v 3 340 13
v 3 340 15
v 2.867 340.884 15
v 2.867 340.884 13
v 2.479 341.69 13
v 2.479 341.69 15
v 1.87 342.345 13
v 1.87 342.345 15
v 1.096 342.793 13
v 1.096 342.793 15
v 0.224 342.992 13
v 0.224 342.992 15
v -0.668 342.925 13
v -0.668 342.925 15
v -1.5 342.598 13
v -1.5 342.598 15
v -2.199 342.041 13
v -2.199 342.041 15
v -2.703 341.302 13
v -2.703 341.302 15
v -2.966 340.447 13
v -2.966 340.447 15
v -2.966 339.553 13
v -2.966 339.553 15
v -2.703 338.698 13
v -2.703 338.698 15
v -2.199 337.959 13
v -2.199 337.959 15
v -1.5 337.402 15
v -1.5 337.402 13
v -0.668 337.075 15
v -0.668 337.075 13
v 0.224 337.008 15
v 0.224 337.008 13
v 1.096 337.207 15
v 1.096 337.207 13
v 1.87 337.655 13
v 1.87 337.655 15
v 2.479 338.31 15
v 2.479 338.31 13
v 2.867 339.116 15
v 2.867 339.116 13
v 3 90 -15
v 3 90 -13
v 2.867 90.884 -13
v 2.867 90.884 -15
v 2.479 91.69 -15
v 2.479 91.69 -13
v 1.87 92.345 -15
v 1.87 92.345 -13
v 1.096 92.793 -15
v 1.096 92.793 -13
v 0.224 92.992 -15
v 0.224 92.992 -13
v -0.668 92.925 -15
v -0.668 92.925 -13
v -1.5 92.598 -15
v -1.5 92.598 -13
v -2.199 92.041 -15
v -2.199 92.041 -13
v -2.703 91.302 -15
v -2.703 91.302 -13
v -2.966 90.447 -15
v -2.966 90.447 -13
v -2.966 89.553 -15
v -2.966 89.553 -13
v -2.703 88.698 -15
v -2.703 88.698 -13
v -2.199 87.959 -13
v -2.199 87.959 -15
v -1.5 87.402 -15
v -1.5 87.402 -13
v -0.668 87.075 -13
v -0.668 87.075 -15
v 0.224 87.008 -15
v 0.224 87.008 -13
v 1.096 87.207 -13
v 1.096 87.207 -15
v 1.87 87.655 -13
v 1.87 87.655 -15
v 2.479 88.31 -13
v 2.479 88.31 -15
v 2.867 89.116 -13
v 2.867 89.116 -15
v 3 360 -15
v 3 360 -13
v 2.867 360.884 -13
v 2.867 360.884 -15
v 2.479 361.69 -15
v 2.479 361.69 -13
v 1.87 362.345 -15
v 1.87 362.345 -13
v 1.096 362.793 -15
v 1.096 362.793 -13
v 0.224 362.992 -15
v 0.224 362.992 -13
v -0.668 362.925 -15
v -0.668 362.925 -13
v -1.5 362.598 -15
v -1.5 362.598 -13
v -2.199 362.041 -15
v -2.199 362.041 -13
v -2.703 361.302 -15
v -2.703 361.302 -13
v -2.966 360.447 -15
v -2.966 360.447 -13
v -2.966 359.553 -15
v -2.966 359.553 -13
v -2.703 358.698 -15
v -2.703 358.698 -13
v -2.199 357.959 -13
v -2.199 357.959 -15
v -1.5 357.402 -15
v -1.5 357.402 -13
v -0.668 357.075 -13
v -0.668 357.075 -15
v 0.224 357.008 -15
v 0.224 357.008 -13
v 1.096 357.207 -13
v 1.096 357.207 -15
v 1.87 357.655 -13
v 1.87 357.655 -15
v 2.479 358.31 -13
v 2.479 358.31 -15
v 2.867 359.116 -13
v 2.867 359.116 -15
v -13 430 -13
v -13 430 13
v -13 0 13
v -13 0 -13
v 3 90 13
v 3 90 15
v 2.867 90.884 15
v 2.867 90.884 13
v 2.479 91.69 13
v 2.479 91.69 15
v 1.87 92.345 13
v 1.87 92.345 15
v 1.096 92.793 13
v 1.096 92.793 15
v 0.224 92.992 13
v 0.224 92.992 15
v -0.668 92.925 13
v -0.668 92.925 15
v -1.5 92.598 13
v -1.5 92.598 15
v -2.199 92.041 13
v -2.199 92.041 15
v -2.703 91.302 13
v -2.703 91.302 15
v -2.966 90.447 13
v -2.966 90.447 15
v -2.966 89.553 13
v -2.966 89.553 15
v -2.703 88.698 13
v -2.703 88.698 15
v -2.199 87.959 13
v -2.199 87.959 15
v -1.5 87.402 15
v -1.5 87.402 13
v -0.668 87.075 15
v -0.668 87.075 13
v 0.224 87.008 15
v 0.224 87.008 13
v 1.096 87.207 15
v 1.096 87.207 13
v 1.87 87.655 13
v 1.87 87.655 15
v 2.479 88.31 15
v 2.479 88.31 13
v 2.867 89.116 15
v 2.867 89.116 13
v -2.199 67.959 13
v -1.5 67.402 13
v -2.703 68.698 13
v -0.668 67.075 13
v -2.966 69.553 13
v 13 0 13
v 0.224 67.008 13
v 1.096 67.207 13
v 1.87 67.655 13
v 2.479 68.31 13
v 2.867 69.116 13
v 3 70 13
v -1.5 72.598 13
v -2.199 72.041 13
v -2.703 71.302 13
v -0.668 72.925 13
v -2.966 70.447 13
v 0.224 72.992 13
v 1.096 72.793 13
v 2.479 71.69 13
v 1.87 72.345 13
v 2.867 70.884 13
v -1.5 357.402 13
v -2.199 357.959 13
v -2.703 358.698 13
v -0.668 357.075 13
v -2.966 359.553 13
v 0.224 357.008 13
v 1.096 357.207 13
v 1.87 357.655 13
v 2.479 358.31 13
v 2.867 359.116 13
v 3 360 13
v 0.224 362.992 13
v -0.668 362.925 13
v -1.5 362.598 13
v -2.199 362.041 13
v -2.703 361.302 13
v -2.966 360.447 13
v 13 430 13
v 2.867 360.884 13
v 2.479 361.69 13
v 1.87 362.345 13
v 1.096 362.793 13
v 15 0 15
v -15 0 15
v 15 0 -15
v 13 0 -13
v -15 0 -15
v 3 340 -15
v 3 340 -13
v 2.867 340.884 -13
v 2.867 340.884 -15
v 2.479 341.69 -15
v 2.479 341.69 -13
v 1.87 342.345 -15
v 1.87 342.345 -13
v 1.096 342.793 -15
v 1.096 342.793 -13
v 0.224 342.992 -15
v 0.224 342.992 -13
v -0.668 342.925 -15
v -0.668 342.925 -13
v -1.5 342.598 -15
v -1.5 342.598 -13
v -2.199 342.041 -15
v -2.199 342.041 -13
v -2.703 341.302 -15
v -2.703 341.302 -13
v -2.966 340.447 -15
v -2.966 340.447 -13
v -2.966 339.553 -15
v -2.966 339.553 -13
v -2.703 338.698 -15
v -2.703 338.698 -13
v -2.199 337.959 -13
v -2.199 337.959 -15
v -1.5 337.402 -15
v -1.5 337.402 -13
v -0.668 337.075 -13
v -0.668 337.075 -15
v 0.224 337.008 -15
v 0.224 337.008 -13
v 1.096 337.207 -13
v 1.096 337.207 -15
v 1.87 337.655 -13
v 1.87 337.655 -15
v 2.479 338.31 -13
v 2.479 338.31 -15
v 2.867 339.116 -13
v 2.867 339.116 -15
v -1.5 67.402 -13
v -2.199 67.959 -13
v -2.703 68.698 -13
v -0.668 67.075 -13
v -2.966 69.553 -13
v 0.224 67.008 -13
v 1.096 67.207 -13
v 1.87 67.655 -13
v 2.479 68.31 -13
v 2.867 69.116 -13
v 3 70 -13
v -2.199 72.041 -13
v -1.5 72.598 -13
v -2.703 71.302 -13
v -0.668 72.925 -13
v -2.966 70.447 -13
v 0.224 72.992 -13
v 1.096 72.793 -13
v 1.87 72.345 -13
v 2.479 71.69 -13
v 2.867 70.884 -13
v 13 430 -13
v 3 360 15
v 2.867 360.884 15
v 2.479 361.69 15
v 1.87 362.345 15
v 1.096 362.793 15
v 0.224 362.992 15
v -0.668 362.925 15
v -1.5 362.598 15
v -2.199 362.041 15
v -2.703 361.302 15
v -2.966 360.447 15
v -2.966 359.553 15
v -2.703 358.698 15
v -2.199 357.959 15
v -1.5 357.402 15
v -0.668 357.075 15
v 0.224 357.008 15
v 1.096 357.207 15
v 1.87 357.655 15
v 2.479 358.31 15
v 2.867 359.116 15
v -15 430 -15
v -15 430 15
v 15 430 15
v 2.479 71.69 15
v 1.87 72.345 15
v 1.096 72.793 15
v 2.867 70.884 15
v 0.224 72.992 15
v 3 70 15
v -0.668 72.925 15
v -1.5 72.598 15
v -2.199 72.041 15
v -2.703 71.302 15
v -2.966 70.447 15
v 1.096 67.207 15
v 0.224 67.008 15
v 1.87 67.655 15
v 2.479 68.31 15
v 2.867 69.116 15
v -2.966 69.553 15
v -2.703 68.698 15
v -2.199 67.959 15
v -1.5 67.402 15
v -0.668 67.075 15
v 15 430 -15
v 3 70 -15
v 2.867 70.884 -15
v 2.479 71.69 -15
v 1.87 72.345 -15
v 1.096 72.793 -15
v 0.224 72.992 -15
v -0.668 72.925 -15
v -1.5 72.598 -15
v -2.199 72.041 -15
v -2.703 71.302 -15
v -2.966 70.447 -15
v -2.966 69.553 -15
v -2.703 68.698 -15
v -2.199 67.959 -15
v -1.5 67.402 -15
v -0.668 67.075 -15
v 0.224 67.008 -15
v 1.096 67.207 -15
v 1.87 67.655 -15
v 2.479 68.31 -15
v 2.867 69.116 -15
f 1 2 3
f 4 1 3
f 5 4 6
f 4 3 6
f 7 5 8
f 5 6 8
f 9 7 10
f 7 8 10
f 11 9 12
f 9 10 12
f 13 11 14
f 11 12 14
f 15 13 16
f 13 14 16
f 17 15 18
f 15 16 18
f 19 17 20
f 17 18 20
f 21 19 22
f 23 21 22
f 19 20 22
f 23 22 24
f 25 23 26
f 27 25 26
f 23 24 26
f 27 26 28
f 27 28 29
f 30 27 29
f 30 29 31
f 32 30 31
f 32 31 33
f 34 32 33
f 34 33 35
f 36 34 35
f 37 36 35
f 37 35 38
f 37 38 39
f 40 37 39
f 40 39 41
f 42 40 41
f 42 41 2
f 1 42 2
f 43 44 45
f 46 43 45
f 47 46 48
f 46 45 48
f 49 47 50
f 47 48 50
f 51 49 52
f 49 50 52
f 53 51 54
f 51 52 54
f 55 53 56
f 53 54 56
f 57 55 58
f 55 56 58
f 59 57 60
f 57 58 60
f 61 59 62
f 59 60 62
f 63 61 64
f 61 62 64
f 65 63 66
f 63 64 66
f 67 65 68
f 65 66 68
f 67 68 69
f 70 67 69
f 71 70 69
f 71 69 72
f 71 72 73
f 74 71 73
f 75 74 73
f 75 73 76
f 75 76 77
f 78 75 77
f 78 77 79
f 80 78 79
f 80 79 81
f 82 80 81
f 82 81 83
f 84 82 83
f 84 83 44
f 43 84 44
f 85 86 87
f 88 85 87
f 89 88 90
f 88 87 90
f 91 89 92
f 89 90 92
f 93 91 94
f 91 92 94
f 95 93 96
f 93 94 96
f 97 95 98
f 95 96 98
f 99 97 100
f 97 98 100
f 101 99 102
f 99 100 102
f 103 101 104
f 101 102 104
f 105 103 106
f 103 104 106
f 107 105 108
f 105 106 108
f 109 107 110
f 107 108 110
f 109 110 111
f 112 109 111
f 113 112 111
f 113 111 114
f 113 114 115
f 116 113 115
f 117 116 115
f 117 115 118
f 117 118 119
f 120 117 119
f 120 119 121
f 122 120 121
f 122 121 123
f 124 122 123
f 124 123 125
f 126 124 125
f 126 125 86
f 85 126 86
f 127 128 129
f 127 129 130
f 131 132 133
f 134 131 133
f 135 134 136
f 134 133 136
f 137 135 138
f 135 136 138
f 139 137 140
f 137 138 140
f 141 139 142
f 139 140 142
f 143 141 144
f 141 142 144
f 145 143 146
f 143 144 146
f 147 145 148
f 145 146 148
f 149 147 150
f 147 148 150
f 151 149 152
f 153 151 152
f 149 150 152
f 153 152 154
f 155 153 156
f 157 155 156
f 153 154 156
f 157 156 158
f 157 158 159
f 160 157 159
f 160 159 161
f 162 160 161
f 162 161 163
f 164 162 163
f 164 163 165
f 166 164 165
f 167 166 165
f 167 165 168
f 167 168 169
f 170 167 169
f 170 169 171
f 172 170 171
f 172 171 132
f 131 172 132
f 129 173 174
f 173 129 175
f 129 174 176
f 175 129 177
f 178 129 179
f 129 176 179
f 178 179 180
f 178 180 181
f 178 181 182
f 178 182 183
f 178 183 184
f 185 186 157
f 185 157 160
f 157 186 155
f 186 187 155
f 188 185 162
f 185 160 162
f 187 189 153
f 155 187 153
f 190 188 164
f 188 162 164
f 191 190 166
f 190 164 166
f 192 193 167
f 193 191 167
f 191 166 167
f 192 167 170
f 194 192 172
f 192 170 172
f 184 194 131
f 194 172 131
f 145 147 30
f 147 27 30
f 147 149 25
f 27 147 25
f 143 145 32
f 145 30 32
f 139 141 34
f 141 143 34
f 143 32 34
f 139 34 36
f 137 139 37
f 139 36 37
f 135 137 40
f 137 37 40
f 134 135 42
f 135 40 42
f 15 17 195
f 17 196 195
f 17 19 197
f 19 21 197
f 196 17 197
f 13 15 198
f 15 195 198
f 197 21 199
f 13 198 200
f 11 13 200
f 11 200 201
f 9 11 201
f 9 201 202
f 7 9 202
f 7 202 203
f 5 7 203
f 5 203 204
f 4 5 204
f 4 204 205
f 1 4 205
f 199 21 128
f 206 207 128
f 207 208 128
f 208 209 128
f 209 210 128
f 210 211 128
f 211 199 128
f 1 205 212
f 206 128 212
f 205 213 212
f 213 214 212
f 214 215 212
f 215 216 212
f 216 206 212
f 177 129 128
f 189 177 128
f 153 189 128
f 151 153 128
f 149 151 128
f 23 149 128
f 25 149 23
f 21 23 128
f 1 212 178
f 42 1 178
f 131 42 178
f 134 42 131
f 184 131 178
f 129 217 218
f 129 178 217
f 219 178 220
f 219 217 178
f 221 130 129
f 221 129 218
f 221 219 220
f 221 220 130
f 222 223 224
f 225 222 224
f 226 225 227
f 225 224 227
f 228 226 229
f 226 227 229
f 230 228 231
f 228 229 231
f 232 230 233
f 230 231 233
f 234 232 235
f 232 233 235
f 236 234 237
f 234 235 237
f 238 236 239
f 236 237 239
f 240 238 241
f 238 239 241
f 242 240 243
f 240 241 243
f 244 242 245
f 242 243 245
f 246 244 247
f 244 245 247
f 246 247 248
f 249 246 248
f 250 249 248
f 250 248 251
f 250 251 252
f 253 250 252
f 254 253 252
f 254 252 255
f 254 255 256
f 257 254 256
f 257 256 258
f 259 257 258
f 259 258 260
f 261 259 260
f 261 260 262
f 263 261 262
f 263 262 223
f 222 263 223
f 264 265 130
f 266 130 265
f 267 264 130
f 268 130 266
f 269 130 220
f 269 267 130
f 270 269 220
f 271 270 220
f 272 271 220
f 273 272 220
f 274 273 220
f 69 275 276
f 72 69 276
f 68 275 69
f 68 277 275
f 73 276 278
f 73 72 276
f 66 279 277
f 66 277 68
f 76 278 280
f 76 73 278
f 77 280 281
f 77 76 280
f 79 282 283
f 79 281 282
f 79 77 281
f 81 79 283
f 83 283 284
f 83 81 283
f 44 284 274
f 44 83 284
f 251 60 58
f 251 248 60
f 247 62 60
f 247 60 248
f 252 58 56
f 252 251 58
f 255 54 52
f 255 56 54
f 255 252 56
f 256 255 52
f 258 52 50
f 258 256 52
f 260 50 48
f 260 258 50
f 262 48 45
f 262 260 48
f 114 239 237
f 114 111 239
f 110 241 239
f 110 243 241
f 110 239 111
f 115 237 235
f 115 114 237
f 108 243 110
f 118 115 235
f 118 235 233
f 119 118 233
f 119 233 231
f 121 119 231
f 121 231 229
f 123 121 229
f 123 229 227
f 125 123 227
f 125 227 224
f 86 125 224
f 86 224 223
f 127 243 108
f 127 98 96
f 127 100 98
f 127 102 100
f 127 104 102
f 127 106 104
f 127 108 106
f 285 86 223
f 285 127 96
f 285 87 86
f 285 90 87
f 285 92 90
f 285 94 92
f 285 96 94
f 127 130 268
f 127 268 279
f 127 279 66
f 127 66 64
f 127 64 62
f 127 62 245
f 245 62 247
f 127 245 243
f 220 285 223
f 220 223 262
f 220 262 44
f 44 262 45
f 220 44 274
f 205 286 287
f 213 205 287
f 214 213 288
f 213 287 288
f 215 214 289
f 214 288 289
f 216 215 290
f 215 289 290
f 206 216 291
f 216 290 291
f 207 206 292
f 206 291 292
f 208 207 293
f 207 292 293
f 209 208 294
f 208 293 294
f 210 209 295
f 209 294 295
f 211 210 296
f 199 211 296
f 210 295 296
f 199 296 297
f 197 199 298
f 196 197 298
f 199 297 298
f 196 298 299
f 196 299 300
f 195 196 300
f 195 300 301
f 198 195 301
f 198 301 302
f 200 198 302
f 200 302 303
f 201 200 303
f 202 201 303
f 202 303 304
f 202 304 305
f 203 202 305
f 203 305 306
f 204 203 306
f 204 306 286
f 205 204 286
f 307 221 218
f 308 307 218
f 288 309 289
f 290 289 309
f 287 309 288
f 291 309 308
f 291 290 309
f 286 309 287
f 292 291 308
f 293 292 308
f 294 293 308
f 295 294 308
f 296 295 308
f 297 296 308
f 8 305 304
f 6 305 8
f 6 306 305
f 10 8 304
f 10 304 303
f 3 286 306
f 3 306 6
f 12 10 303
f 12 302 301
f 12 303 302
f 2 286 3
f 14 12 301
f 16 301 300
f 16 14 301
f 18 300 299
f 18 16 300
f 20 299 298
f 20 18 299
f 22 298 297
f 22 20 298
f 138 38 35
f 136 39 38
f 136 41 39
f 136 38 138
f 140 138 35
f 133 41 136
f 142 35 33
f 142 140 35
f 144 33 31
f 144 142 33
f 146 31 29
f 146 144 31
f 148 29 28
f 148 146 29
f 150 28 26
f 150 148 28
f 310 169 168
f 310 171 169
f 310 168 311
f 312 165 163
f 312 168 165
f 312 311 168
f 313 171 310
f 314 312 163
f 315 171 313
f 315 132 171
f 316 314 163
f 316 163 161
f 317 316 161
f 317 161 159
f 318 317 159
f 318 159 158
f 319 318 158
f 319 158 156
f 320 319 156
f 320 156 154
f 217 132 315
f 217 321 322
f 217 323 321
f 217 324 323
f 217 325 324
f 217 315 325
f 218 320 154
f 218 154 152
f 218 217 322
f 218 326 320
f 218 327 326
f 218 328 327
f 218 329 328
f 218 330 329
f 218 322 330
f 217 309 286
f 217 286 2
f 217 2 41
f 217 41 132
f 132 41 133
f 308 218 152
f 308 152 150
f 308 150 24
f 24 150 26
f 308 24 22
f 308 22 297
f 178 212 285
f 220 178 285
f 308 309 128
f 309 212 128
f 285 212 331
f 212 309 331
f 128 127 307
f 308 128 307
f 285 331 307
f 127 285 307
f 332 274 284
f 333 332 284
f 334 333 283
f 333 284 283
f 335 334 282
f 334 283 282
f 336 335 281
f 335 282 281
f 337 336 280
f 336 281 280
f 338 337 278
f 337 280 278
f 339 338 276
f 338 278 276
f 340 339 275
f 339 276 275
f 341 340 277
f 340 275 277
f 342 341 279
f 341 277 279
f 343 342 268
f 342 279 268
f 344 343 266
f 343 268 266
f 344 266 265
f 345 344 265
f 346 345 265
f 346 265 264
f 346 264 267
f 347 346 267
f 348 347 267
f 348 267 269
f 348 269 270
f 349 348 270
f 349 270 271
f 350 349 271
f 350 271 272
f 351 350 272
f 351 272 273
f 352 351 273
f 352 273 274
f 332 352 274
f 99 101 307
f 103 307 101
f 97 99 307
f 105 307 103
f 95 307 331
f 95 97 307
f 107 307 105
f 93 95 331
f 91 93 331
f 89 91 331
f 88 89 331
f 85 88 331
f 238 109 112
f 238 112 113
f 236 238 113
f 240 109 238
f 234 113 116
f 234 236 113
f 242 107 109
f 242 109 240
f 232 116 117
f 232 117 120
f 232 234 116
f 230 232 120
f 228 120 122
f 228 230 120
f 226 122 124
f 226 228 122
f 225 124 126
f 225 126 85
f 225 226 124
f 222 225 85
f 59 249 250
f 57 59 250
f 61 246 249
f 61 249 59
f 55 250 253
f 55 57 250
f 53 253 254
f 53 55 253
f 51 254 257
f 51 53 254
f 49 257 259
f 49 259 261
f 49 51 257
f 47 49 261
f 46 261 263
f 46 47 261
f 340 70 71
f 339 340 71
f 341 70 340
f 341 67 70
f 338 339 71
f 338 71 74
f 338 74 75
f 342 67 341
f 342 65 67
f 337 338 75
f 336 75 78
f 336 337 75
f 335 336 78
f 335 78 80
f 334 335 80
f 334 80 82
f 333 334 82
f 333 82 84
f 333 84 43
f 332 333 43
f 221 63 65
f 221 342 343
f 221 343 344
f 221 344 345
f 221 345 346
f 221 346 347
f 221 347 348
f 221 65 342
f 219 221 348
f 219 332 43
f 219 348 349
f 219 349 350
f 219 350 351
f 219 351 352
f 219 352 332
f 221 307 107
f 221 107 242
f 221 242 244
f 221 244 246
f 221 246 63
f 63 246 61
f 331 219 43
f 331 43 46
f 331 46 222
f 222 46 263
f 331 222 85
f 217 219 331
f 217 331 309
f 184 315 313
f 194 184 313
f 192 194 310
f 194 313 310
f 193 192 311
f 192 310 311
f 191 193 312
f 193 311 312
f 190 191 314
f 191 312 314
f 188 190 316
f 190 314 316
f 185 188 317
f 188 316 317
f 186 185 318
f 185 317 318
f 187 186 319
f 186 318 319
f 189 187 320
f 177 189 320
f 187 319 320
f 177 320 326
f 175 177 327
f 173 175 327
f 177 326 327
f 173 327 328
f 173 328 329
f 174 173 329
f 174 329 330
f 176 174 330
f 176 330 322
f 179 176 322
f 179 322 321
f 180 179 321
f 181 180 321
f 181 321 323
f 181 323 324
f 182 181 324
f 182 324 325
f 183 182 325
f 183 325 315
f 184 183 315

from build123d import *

# Parameters (mm, degrees)
BOSS_EXTRUDE1_DEPTH = 430
SKETCH2_W           = 26
SKETCH2_H           = 26
CUT_EXTRUDE1_DEPTH  = 430
SKETCH3_R           = 3
CUT_EXTRUDE2_DEPTH  = 30


with BuildPart() as part:
    # Sketch1 → Boss-Extrude1 (new body)
    with BuildSketch(Plane(origin=(0, 0, 0), x_dir=(1, 0, 0), z_dir=(0, 1, 0))):
        Polygon((-15, 0), (-15, 15), (15, 15), (15, -15), (-15, -15), align=None)
    extrude(amount=BOSS_EXTRUDE1_DEPTH)

    # Sketch2 → Cut-Extrude1 (cut)
    with BuildSketch(Plane(origin=(0, 430, 0), x_dir=(1, 0, 0), z_dir=(0, 1, 0))):
        Rectangle(SKETCH2_W, SKETCH2_H)
    extrude(amount=-CUT_EXTRUDE1_DEPTH, mode=Mode.SUBTRACT)

    # Sketch3 → Cut-Extrude2 (cut)
    with BuildSketch(Plane.XY.offset(15)):
        with Locations((0, 360)):
            Circle(SKETCH3_R)
        with Locations((0, 340)):
            Circle(SKETCH3_R)
        with Locations((0, 90)):
            Circle(SKETCH3_R)
        with Locations((0, 70)):
            Circle(SKETCH3_R)
    extrude(amount=-CUT_EXTRUDE2_DEPTH, mode=Mode.SUBTRACT)


solid = part.part
